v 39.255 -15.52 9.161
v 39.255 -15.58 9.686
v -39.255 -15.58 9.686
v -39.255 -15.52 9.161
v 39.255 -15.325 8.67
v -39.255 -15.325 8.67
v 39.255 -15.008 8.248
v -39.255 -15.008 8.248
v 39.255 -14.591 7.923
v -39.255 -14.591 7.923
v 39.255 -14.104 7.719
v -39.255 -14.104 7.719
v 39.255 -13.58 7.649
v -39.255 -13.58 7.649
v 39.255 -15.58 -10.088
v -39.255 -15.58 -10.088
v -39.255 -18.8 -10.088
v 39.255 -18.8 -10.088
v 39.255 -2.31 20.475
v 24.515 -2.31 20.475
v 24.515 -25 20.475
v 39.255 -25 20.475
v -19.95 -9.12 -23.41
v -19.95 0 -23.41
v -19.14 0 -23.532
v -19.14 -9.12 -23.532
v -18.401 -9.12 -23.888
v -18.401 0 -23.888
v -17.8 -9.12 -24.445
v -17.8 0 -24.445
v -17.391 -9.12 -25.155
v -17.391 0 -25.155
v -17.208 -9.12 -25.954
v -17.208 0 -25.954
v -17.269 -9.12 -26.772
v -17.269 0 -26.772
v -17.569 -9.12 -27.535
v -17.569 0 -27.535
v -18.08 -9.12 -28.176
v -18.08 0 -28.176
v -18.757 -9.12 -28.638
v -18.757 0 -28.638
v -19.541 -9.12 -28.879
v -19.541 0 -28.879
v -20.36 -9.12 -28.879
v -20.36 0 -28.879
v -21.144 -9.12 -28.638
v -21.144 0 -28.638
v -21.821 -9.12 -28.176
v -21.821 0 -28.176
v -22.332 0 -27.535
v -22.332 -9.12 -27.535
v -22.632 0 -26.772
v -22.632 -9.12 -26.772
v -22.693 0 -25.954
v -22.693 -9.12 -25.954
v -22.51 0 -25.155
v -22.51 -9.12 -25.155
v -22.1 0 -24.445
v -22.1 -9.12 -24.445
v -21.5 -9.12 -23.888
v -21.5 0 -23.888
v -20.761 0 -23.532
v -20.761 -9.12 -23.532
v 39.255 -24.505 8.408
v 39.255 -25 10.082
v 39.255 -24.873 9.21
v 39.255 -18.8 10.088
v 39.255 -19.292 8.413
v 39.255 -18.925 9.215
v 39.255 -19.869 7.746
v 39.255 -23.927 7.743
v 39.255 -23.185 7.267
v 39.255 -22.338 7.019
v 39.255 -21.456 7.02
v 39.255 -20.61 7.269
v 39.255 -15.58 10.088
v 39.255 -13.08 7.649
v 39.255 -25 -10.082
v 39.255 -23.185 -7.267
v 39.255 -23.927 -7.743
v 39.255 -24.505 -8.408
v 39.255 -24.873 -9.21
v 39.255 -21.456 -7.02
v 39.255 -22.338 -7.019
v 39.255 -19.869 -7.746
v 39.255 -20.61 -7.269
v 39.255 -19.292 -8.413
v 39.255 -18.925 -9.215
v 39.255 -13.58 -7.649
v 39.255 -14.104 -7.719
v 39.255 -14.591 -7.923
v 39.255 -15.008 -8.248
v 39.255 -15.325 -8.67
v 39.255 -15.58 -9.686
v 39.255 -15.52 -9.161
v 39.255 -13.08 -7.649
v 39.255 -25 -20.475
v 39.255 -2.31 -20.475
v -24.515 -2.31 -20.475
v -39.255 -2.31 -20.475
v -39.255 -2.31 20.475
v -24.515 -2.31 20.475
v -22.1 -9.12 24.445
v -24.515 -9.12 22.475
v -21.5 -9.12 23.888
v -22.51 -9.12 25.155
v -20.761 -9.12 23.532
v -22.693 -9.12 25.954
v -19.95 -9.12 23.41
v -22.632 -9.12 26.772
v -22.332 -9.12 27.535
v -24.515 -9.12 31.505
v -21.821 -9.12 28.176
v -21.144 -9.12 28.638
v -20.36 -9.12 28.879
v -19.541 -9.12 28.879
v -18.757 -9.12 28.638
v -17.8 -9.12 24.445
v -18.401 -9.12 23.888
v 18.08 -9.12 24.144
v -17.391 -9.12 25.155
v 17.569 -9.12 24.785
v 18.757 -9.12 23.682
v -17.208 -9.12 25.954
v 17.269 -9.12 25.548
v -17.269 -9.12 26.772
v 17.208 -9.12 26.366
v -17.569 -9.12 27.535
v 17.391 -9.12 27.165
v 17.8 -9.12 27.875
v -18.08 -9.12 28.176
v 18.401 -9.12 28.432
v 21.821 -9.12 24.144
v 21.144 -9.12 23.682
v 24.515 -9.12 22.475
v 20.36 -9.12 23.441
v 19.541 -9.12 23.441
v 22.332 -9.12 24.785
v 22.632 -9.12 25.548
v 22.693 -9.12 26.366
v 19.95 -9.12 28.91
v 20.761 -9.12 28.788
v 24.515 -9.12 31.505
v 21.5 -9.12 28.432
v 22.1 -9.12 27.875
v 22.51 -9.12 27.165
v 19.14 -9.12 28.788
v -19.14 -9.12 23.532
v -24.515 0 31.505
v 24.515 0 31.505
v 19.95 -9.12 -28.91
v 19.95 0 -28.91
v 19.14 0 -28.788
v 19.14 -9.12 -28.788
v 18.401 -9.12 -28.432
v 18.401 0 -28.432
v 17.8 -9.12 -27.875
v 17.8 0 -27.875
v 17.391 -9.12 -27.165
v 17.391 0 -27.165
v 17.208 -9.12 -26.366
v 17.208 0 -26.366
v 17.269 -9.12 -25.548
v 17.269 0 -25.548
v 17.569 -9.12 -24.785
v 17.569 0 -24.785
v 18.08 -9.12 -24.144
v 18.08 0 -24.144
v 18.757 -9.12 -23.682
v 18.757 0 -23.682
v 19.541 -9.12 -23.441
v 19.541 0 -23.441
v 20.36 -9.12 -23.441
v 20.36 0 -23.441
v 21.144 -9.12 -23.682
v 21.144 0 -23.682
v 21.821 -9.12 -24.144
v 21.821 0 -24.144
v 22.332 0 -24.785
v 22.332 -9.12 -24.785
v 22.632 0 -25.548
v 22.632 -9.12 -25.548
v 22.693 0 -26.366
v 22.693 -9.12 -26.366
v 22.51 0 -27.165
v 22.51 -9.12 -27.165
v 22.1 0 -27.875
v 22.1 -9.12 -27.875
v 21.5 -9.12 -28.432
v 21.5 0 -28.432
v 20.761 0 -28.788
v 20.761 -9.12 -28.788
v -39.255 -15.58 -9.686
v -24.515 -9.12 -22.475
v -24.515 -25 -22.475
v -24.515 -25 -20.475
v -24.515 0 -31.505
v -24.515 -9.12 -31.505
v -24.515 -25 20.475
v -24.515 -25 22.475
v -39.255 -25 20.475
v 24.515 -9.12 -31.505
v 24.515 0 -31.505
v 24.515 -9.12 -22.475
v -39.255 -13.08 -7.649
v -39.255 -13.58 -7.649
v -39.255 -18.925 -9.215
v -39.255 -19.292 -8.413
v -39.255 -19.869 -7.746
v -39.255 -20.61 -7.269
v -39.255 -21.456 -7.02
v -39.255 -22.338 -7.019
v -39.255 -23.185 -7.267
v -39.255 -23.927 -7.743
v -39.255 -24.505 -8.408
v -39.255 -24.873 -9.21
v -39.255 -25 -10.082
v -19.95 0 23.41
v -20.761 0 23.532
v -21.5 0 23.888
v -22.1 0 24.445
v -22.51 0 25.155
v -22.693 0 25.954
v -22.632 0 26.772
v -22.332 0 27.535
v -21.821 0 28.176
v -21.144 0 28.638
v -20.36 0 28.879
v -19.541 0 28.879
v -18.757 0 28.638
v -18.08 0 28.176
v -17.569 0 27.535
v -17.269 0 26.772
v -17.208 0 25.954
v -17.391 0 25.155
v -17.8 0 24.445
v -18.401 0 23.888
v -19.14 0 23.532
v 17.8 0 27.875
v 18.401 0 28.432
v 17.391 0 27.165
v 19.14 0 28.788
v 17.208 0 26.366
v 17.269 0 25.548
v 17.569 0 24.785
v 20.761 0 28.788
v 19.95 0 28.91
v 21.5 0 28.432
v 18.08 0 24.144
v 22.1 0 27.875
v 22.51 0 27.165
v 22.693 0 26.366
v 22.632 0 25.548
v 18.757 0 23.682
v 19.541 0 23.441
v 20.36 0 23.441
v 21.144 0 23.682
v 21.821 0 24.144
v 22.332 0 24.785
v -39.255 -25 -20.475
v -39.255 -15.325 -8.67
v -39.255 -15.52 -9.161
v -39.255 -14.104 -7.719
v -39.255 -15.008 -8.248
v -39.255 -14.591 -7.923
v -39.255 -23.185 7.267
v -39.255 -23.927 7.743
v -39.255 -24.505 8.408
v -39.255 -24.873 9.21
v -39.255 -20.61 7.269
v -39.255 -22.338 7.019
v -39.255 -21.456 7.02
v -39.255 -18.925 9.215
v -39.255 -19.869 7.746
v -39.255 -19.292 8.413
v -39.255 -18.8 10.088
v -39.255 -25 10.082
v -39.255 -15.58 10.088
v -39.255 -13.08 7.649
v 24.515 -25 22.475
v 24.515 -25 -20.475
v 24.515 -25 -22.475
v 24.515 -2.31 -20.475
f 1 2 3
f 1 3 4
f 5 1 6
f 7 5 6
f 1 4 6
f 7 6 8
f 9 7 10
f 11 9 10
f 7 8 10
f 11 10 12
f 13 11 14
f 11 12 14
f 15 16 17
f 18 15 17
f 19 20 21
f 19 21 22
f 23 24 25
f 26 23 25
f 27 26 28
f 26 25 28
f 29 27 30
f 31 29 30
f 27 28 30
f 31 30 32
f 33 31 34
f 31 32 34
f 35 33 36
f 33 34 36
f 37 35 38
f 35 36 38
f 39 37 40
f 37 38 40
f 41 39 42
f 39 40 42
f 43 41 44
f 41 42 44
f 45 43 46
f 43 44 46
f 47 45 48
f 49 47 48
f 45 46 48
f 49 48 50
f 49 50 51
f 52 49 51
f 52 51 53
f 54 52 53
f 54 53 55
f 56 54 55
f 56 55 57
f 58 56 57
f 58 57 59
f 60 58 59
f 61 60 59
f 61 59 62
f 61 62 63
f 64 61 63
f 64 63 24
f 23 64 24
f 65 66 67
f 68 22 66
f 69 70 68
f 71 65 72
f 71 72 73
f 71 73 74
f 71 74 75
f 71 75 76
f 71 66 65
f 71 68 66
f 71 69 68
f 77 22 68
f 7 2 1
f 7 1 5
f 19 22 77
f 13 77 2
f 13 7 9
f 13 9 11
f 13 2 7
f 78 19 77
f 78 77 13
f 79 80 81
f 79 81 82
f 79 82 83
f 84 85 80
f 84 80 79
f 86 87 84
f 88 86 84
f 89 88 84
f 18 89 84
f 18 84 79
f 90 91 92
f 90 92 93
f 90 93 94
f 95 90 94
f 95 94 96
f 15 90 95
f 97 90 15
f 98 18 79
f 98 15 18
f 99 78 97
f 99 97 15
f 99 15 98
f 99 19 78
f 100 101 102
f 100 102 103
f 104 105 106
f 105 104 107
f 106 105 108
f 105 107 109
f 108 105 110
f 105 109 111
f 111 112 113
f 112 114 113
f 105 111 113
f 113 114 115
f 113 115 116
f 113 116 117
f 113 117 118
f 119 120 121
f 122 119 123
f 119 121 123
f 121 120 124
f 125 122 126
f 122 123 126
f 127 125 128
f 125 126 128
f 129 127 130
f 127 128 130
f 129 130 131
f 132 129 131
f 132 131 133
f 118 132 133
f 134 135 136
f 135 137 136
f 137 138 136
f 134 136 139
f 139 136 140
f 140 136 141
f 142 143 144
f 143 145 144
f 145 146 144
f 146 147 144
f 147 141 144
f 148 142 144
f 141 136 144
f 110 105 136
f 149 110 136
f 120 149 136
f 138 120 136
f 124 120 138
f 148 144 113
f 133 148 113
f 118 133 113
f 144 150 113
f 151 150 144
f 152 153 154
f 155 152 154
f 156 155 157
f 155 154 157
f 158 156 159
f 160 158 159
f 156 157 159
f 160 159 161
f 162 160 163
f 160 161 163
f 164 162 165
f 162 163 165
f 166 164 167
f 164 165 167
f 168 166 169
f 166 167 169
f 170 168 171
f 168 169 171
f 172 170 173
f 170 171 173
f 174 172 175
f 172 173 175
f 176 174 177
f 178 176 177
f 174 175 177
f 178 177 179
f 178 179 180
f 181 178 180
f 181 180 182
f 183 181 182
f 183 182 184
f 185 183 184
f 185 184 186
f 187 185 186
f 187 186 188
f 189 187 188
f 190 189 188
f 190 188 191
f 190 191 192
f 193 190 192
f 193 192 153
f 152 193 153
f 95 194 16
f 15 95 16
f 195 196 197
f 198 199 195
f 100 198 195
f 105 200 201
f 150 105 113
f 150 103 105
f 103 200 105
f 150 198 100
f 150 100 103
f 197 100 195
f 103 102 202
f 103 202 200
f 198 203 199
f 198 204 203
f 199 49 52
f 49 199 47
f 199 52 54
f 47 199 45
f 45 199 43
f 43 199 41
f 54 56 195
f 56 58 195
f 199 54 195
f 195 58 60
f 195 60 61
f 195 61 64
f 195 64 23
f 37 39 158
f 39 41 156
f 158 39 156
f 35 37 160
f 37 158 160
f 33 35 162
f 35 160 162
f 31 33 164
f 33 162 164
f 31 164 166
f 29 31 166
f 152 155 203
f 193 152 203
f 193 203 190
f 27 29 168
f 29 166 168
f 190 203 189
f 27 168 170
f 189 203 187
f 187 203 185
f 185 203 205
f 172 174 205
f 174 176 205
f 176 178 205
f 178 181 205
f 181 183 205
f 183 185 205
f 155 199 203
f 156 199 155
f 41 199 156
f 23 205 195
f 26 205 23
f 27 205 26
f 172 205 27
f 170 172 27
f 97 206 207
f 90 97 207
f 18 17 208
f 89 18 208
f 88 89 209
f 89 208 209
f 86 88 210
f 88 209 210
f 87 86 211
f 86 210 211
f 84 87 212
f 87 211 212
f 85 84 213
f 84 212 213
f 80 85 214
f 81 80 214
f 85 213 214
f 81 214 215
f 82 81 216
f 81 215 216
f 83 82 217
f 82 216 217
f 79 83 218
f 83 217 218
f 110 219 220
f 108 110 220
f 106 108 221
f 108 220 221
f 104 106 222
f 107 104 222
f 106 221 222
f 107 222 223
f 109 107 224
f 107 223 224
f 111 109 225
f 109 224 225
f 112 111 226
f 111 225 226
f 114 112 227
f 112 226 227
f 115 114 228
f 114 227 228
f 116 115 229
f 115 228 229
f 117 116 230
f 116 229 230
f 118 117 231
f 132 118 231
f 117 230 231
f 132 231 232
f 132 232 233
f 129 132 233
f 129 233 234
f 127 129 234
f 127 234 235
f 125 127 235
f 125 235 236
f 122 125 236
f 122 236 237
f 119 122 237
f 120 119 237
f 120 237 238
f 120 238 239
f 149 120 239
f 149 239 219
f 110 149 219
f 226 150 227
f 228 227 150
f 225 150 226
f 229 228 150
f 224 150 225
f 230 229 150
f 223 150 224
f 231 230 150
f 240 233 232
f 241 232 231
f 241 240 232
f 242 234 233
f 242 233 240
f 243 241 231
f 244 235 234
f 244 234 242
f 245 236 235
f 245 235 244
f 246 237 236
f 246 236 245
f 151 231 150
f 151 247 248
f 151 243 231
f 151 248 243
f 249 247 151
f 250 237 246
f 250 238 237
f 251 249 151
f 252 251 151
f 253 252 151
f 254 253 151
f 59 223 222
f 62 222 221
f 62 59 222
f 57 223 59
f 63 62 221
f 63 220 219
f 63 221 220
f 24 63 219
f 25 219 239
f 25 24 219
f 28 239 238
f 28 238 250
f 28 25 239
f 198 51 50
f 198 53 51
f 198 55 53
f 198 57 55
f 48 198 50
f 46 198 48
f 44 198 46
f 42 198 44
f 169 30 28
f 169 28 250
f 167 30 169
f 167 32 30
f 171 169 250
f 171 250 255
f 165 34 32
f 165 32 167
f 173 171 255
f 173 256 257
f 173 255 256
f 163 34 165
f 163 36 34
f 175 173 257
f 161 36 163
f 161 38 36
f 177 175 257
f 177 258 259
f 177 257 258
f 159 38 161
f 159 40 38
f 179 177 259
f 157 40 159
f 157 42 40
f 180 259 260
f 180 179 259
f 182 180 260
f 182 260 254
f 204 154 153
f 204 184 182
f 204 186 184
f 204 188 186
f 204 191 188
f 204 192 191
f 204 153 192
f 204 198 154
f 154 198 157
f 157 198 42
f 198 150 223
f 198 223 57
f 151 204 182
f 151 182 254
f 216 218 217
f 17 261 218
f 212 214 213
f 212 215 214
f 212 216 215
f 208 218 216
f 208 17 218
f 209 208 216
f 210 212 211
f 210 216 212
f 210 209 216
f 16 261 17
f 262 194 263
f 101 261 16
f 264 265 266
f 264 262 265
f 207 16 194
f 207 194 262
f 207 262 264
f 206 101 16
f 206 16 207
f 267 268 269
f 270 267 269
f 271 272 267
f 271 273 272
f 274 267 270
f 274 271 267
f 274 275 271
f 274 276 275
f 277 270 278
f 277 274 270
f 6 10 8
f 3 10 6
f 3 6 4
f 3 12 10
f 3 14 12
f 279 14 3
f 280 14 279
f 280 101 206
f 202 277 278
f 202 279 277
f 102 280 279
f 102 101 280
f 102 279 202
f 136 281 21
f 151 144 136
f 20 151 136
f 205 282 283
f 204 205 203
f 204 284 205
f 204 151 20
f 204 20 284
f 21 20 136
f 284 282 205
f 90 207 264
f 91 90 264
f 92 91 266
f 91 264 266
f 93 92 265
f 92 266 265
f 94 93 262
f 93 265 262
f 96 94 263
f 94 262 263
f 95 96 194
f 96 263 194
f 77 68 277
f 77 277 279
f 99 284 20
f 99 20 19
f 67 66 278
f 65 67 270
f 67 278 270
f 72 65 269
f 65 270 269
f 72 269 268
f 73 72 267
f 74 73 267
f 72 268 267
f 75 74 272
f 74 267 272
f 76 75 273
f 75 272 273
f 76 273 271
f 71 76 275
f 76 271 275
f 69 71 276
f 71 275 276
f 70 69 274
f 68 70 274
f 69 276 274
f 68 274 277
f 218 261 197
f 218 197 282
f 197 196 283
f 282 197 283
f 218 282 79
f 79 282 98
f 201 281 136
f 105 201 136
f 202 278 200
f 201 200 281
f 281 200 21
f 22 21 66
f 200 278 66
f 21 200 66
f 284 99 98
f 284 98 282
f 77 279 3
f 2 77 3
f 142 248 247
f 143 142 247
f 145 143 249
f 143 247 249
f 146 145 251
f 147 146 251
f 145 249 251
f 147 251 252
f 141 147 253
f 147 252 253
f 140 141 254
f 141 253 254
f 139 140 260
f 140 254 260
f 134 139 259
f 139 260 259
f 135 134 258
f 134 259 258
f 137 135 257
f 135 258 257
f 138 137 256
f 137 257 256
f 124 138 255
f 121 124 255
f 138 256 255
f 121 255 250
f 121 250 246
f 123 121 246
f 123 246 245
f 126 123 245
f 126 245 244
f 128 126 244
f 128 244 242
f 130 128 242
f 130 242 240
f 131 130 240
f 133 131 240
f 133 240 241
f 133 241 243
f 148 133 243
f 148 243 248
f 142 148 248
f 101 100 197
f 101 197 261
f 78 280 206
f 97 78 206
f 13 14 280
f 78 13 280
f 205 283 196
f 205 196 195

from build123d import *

# Parameters (mm, degrees)
RESSALTO_EXTRUS_O1_DEPTH = 25
ESBO_O2_R                = 2.75
CORTE_EXTRUS_O1_DEPTH    = 25
ESBO_O3_W                = 14.74
ESBO_O3_H                = 40.95
CORTE_EXTRUS_O2_DEPTH    = 2.31
CORTE_EXTRUS_O4_START    = -49.030903
ESBO_O7_W                = 9.03
ESBO_O7_H                = 15.88
CORTE_EXTRUS_O4_DEPTH    = 49.030903
CORTE_EXTRUS_O5_DEPTH    = 78.510903247


with BuildPart() as part:
    # Esboço1 → Ressalto-extrusão1 (new body)
    with BuildSketch(Plane(origin=(0, 0, 0), x_dir=(1, 0, 0), z_dir=(0, 1, 0))):
        Polygon((-24.515451624, -20.475), (-24.515451624, -31.505), (24.515451624, -31.505), (24.515451624, -20.475), (39.255451624, -20.475), (39.255451624, 20.475), (24.515451624, 20.475), (24.515451624, 31.505), (-24.515451624, 31.505), (-24.515451624, 20.475), (-39.255451624, 20.475), (-39.255451624, -20.475), align=None)
    extrude(amount=-RESSALTO_EXTRUS_O1_DEPTH)

    # Esboço2 → Corte-extrusão1 (cut)
    with BuildSketch(Plane(origin=(0, 0, 0), x_dir=(1, 0, 0), z_dir=(0, 1, 0))):
        with Locations(Location((-19.950451624, 26.16, 0), (0, 0, 270))):
            Circle(ESBO_O2_R)
        with Locations(Location((19.950451624, 26.16, 0), (0, 0, 90))):
            Circle(ESBO_O2_R)
        with Locations(Location((19.950451624, -26.16, 0), (0, 0, 270))):
            Circle(ESBO_O2_R)
        with Locations(Location((-19.950451624, -26.16, 0), (0, 0, 90))):
            Circle(ESBO_O2_R)
    extrude(amount=-CORTE_EXTRUS_O1_DEPTH, mode=Mode.SUBTRACT)

    # Esboço3 → Corte-extrusão2 (cut)
    with BuildSketch(Plane(origin=(0, 0, 0), x_dir=(1, 0, 0), z_dir=(0, 1, 0))):
        with Locations((31.885451624, 0)):
            Rectangle(ESBO_O3_W, ESBO_O3_H)
        with Locations((-31.885451624, 0)):
            Rectangle(ESBO_O3_W, ESBO_O3_H)
    extrude(amount=-CORTE_EXTRUS_O2_DEPTH, mode=Mode.SUBTRACT)

    # Esboço7 → Corte-extrusão4 (cut)
    with BuildSketch(Plane.ZY.offset(24.515451624).offset(CORTE_EXTRUS_O4_START)):
        with Locations((-26.99, -17.06)):
            Rectangle(ESBO_O7_W, ESBO_O7_H)
        with Locations((26.99, -17.06)):
            Rectangle(ESBO_O7_W, ESBO_O7_H)
    extrude(amount=CORTE_EXTRUS_O4_DEPTH, mode=Mode.SUBTRACT)

    # Esboço5 → Corte-extrusão5 (cut)
    with BuildSketch(Plane.ZY.offset(39.255451624)):
        with BuildLine():
            Line((-10.088028961, -25.000004947), (10.088017042, -25.000004947))
            ThreePointArc((10.088017042, -25.000004947), (6.988017042, -21.900004947), (10.088017042, -18.800004947))
            Line((10.088017042, -18.800004947), (10.088017042, -15.580004947))
            Line((10.088017042, -15.580004947), (9.685831834, -15.580004947))
            ThreePointArc((9.685831834, -15.580004947), (8.247865132, -15.007522497), (7.648994034, -13.580344232))
            Line((7.648994034, -13.580344232), (7.648994034, -13.080004947))
            Line((7.648994034, -13.080004947), (-7.649005954, -13.080004947))
            Line((-7.649005954, -13.080004947), (-7.649005954, -13.580344232))
            ThreePointArc((-7.649005954, -13.580344232), (-8.247877052, -15.007522497), (-9.685843753, -15.580004947))
            Line((-9.685843753, -15.580004947), (-10.088028961, -15.580004947))
            Line((-10.088028961, -15.580004947), (-10.088028961, -18.800004947))
            ThreePointArc((-10.088028961, -18.800004947), (-6.988028961, -21.900004947), (-10.088028961, -25.000004947))
        make_face()
    extrude(amount=-CORTE_EXTRUS_O5_DEPTH, mode=Mode.SUBTRACT)


solid = part.part
